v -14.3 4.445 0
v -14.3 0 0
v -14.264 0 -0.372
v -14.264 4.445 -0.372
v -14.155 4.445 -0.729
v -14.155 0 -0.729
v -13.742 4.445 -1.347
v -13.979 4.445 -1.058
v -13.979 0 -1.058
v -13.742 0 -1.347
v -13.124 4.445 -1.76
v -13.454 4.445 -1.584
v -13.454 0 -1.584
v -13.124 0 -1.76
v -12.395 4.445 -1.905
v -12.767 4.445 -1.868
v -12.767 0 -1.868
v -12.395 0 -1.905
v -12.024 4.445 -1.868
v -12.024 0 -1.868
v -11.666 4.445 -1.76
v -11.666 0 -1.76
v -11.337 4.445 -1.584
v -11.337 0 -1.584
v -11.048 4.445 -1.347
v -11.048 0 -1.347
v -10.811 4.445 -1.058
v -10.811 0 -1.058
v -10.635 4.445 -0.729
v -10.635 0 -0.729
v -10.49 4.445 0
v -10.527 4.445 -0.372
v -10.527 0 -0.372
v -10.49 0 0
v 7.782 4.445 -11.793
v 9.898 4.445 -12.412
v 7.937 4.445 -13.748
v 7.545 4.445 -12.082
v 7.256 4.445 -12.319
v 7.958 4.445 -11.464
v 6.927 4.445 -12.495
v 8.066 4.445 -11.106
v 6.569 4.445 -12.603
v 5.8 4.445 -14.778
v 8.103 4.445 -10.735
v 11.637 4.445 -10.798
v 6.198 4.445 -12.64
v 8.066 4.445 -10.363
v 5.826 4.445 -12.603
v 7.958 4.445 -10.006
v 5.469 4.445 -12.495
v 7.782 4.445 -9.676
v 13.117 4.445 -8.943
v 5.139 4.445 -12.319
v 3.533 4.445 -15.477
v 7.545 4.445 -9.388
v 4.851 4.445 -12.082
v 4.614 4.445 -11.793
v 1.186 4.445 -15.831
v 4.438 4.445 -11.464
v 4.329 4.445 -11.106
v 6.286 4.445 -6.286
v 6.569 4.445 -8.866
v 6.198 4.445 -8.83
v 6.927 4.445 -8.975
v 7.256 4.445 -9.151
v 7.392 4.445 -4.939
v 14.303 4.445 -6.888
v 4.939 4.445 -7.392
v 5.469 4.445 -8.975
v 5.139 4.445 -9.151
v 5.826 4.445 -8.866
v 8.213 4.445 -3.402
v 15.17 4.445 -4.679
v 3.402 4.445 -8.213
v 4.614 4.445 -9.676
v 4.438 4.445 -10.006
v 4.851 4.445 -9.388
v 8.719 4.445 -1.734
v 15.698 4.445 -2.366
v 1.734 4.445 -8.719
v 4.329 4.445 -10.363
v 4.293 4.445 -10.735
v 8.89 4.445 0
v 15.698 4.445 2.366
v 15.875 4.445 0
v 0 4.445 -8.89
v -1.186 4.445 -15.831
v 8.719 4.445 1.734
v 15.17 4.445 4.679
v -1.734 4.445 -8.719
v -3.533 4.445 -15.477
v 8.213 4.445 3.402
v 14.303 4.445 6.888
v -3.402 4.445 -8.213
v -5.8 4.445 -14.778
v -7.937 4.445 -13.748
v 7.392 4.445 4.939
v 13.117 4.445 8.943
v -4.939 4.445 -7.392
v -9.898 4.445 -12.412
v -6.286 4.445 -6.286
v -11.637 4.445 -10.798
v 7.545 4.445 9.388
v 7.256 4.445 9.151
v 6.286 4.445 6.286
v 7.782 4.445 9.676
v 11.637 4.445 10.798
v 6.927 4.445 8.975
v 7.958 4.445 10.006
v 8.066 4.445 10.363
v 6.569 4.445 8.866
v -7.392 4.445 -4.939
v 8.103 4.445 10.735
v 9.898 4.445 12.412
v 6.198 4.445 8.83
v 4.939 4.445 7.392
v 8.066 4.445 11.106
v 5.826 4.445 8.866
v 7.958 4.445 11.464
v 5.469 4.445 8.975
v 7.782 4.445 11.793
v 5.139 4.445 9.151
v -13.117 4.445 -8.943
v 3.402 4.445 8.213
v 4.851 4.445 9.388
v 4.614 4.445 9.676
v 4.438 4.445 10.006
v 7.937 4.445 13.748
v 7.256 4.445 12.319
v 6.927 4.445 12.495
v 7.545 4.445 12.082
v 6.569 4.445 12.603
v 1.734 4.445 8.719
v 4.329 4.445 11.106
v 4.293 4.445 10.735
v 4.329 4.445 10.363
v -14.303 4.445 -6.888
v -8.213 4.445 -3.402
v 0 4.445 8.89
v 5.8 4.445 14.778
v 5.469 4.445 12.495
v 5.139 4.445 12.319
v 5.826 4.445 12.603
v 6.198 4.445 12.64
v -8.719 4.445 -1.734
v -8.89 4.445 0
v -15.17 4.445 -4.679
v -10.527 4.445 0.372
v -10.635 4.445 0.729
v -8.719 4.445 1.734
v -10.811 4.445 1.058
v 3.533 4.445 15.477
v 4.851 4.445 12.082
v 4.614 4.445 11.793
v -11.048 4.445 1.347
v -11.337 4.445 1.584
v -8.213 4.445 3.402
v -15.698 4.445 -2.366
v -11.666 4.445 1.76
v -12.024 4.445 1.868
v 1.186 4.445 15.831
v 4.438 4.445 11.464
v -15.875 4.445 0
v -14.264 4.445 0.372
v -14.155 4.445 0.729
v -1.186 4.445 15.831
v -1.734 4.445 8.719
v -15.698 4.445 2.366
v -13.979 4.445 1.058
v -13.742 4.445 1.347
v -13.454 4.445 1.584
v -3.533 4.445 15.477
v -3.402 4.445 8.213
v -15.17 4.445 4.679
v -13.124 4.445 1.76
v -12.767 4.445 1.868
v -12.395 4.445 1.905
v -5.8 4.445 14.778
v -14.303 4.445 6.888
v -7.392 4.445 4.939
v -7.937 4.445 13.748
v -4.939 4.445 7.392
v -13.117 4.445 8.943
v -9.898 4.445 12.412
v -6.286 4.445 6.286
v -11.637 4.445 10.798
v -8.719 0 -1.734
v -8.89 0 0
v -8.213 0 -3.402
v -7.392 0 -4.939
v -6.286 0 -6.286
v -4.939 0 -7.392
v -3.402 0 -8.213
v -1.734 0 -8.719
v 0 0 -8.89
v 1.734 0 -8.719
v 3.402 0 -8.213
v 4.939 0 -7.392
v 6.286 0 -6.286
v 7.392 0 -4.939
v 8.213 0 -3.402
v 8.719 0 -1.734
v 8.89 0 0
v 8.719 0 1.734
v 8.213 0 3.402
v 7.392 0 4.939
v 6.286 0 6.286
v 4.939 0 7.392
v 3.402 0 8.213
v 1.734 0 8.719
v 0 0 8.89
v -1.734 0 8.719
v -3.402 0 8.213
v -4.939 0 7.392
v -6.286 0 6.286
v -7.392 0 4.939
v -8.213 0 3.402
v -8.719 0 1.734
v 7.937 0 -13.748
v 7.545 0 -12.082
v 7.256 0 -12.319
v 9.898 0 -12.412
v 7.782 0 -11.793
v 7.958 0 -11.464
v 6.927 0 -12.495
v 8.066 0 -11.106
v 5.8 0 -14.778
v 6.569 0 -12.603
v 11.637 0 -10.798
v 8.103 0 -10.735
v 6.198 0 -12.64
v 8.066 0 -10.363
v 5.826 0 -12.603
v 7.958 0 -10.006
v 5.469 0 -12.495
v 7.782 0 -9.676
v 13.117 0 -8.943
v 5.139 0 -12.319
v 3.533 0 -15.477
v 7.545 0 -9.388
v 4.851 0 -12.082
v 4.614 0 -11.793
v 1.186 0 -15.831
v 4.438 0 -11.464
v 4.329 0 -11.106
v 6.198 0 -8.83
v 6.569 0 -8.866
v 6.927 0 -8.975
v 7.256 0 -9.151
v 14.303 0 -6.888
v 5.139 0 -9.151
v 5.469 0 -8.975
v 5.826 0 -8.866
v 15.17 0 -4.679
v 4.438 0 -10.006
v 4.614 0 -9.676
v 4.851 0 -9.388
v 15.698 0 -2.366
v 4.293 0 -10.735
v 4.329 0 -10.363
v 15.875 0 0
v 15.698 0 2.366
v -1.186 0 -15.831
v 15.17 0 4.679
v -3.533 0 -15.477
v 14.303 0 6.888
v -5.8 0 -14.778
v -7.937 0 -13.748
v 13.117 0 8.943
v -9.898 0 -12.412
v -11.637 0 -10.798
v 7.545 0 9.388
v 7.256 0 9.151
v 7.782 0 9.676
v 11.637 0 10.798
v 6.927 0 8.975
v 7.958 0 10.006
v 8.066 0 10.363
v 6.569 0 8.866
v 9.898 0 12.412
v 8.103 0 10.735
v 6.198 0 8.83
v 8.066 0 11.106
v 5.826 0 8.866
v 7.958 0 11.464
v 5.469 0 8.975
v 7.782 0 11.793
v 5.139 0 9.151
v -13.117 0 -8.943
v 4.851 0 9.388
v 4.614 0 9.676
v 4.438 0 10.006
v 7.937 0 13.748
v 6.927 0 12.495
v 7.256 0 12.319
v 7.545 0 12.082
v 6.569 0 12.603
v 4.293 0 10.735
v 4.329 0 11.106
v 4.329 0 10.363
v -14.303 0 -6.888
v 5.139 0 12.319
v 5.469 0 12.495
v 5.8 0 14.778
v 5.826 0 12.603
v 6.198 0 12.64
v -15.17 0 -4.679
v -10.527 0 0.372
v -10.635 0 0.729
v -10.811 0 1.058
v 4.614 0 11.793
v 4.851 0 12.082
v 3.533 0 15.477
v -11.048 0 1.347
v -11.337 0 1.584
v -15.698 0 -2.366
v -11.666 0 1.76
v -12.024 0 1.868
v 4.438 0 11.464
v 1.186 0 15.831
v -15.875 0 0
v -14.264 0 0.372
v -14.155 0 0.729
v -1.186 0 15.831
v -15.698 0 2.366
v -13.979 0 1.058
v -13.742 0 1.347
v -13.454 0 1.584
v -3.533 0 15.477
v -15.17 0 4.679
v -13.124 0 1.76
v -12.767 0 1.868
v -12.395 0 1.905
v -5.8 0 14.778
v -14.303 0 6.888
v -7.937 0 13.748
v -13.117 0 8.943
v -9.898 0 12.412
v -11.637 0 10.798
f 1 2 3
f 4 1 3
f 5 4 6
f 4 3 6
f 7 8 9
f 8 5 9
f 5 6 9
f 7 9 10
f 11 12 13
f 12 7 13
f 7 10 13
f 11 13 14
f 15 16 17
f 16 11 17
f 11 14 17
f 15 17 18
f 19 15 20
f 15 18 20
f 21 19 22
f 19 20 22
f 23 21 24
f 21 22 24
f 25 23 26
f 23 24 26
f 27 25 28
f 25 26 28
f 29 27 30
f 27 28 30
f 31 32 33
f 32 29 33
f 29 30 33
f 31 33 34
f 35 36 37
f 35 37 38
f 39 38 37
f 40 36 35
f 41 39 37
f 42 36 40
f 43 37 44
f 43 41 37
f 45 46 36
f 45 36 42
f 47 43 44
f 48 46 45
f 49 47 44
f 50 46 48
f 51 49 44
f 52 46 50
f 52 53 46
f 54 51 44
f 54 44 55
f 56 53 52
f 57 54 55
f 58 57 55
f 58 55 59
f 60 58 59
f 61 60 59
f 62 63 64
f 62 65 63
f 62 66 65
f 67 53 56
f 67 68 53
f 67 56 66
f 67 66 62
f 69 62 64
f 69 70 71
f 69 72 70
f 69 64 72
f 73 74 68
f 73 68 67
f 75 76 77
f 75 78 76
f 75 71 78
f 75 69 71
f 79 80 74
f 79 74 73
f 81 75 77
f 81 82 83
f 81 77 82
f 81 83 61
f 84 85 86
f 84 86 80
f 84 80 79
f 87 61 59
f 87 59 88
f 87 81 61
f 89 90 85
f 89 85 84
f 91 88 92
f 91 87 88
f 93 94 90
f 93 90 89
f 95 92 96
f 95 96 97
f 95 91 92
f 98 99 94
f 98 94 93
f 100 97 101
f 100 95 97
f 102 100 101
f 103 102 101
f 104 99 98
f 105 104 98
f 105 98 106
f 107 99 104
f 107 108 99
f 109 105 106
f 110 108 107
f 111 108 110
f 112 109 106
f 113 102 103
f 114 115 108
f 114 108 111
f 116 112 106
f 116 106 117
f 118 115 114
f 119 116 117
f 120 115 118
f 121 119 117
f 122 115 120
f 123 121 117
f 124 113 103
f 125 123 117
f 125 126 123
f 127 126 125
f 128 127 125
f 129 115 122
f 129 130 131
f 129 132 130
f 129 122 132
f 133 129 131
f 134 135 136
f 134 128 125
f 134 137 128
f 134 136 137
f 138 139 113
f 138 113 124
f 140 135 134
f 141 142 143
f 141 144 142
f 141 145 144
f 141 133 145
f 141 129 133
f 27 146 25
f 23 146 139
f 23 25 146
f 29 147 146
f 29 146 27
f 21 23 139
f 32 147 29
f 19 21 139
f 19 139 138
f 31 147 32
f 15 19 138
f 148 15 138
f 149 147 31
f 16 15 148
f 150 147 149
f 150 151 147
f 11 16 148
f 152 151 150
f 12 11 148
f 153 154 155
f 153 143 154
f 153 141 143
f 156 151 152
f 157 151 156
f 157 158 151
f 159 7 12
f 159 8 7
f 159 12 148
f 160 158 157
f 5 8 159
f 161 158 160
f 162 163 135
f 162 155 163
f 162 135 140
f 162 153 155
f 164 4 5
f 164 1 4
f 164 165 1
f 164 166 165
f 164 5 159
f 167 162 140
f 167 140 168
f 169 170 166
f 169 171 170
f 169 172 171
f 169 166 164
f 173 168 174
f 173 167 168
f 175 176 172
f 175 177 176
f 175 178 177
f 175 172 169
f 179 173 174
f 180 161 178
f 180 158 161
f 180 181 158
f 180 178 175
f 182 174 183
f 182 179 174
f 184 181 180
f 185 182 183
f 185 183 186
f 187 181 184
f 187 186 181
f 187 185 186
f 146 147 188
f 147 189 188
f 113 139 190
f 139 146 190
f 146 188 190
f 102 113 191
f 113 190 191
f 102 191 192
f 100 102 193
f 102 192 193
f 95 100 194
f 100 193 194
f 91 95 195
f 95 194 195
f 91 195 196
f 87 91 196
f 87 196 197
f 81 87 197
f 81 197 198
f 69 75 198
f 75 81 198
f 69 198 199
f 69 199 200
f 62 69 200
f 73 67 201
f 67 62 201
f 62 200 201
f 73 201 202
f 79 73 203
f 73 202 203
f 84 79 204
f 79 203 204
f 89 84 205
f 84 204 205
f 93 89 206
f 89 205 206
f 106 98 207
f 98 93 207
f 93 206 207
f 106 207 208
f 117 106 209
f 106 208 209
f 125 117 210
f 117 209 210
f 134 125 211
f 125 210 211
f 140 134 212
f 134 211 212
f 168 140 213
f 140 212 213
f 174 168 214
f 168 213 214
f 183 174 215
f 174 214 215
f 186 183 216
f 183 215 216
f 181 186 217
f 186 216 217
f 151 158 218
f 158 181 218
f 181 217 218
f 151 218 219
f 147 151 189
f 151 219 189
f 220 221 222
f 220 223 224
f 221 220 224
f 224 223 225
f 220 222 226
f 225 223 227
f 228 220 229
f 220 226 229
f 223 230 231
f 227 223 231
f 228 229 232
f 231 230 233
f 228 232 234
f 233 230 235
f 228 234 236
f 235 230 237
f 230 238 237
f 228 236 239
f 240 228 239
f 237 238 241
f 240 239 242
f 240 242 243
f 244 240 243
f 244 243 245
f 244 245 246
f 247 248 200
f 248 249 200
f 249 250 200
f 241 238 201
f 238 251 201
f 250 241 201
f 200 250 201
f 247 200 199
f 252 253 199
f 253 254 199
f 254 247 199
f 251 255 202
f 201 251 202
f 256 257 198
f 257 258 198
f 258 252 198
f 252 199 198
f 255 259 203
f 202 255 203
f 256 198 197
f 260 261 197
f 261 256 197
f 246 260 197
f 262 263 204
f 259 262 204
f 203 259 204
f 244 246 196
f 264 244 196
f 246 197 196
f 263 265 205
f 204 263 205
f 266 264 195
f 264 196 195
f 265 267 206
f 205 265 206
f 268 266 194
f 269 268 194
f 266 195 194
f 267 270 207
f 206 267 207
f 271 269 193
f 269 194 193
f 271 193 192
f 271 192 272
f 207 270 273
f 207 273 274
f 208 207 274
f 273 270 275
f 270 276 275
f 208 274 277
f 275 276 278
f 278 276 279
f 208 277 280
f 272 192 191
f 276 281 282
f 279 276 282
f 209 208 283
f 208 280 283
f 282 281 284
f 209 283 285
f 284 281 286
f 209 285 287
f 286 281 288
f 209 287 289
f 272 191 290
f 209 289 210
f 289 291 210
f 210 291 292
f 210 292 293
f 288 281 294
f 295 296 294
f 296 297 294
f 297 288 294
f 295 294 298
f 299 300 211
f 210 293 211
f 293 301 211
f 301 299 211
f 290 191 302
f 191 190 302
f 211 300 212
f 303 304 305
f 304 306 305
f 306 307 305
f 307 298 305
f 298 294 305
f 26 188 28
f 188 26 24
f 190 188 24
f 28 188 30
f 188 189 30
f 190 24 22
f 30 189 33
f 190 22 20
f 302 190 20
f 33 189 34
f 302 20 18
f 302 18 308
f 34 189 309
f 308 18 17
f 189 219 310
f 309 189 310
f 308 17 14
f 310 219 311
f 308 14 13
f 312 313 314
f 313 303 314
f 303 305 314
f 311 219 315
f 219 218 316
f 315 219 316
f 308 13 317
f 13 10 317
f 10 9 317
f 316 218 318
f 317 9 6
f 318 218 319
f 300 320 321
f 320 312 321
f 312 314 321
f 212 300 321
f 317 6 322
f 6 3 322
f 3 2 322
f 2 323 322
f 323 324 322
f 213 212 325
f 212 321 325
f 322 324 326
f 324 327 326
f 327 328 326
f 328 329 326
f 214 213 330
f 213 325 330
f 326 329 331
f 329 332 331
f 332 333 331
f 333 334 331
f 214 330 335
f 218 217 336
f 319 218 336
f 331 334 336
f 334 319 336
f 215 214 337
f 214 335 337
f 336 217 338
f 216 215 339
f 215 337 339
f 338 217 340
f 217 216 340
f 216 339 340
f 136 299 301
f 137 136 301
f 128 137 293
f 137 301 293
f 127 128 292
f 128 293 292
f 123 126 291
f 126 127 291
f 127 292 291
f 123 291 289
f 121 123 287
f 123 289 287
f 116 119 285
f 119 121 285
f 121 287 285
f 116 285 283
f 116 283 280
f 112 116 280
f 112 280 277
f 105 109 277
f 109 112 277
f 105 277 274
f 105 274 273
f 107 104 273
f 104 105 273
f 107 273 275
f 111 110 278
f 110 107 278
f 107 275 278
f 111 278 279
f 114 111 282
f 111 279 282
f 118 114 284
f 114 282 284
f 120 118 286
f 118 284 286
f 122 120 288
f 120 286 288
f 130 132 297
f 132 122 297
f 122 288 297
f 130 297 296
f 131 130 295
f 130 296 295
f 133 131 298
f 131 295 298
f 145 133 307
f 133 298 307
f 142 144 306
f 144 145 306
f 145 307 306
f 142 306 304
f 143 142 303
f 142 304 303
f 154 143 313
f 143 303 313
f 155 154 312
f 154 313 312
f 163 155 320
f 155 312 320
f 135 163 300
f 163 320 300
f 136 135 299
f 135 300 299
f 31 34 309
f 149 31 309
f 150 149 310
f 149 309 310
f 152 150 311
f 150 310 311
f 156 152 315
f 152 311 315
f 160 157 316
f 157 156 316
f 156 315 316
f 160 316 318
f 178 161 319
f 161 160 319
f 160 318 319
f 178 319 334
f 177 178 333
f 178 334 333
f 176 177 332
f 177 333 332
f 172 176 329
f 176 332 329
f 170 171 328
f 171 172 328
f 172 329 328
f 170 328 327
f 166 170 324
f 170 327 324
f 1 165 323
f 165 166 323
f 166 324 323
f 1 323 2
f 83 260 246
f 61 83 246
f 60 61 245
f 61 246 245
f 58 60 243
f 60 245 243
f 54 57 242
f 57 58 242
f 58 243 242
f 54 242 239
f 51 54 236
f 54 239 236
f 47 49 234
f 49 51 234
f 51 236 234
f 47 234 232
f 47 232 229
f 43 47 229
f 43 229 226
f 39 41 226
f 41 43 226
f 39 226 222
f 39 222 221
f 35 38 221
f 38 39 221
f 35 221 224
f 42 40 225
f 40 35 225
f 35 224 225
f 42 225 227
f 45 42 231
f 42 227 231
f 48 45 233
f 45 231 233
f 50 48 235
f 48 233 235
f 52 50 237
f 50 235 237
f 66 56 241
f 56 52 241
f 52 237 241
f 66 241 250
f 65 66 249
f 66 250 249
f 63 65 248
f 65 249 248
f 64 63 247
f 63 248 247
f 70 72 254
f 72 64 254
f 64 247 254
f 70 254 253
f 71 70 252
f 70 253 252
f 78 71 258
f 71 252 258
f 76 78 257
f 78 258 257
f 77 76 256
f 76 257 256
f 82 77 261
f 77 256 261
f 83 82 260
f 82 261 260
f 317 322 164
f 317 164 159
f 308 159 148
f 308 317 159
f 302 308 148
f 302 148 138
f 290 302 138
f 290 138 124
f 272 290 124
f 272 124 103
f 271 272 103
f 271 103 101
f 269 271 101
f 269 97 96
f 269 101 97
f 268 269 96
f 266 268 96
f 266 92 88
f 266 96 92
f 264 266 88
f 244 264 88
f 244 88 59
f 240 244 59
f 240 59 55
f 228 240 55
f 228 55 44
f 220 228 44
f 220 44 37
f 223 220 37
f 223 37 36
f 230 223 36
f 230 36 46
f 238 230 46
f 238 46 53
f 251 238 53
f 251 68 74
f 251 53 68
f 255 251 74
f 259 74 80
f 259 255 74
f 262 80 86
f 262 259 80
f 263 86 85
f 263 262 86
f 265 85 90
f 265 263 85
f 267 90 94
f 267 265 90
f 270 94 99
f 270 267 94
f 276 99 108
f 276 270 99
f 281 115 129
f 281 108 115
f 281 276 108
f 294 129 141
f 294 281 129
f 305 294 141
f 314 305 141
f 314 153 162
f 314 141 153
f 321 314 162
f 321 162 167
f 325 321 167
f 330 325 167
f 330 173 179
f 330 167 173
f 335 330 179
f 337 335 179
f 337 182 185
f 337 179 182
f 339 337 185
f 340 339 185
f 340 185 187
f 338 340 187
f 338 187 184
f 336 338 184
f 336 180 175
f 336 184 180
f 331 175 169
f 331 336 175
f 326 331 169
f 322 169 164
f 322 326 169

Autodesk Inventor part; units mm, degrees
ref_plane "YZ Plane" through (0, 0, 0) normal (1, 0, 0) x (0, 1, 0)
ref_plane "XZ Plane" through (0, 0, 0) normal (0, 1, 0) x (-1, 0, 0)
ref_plane "XY Plane" through (0, 0, 0) normal (0, 0, 1) x (1, 0, 0)
sketch "Sketch1" plane through (0, 0, 0) normal (0, 1, 0) x (-1, 0, 0)
  circle A0 centre (0, 0) radius 15.875
  line L0 (0, 0) -> (12.3952, 0)
  circle A1 centre (12.3952, 0) radius 1.905
  circle A2 centre (0, 0) radius 8.89
  circle A3 centre (-6.1976, 10.7346) radius 1.905
  circle A4 centre (-6.1976, -10.7346) radius 1.905
  dimension "d0" = 31.75
  dimension "d1" = 12.3952
  dimension "d2" = 3.81
  dimension "d3" = 17.78
  dimension "d6" = 360
extrude "Extrusion1" add sketch "Sketch1" along normal blind 4.445
properties part number "SmallSpoolExpander" material "ABS Plastic"
